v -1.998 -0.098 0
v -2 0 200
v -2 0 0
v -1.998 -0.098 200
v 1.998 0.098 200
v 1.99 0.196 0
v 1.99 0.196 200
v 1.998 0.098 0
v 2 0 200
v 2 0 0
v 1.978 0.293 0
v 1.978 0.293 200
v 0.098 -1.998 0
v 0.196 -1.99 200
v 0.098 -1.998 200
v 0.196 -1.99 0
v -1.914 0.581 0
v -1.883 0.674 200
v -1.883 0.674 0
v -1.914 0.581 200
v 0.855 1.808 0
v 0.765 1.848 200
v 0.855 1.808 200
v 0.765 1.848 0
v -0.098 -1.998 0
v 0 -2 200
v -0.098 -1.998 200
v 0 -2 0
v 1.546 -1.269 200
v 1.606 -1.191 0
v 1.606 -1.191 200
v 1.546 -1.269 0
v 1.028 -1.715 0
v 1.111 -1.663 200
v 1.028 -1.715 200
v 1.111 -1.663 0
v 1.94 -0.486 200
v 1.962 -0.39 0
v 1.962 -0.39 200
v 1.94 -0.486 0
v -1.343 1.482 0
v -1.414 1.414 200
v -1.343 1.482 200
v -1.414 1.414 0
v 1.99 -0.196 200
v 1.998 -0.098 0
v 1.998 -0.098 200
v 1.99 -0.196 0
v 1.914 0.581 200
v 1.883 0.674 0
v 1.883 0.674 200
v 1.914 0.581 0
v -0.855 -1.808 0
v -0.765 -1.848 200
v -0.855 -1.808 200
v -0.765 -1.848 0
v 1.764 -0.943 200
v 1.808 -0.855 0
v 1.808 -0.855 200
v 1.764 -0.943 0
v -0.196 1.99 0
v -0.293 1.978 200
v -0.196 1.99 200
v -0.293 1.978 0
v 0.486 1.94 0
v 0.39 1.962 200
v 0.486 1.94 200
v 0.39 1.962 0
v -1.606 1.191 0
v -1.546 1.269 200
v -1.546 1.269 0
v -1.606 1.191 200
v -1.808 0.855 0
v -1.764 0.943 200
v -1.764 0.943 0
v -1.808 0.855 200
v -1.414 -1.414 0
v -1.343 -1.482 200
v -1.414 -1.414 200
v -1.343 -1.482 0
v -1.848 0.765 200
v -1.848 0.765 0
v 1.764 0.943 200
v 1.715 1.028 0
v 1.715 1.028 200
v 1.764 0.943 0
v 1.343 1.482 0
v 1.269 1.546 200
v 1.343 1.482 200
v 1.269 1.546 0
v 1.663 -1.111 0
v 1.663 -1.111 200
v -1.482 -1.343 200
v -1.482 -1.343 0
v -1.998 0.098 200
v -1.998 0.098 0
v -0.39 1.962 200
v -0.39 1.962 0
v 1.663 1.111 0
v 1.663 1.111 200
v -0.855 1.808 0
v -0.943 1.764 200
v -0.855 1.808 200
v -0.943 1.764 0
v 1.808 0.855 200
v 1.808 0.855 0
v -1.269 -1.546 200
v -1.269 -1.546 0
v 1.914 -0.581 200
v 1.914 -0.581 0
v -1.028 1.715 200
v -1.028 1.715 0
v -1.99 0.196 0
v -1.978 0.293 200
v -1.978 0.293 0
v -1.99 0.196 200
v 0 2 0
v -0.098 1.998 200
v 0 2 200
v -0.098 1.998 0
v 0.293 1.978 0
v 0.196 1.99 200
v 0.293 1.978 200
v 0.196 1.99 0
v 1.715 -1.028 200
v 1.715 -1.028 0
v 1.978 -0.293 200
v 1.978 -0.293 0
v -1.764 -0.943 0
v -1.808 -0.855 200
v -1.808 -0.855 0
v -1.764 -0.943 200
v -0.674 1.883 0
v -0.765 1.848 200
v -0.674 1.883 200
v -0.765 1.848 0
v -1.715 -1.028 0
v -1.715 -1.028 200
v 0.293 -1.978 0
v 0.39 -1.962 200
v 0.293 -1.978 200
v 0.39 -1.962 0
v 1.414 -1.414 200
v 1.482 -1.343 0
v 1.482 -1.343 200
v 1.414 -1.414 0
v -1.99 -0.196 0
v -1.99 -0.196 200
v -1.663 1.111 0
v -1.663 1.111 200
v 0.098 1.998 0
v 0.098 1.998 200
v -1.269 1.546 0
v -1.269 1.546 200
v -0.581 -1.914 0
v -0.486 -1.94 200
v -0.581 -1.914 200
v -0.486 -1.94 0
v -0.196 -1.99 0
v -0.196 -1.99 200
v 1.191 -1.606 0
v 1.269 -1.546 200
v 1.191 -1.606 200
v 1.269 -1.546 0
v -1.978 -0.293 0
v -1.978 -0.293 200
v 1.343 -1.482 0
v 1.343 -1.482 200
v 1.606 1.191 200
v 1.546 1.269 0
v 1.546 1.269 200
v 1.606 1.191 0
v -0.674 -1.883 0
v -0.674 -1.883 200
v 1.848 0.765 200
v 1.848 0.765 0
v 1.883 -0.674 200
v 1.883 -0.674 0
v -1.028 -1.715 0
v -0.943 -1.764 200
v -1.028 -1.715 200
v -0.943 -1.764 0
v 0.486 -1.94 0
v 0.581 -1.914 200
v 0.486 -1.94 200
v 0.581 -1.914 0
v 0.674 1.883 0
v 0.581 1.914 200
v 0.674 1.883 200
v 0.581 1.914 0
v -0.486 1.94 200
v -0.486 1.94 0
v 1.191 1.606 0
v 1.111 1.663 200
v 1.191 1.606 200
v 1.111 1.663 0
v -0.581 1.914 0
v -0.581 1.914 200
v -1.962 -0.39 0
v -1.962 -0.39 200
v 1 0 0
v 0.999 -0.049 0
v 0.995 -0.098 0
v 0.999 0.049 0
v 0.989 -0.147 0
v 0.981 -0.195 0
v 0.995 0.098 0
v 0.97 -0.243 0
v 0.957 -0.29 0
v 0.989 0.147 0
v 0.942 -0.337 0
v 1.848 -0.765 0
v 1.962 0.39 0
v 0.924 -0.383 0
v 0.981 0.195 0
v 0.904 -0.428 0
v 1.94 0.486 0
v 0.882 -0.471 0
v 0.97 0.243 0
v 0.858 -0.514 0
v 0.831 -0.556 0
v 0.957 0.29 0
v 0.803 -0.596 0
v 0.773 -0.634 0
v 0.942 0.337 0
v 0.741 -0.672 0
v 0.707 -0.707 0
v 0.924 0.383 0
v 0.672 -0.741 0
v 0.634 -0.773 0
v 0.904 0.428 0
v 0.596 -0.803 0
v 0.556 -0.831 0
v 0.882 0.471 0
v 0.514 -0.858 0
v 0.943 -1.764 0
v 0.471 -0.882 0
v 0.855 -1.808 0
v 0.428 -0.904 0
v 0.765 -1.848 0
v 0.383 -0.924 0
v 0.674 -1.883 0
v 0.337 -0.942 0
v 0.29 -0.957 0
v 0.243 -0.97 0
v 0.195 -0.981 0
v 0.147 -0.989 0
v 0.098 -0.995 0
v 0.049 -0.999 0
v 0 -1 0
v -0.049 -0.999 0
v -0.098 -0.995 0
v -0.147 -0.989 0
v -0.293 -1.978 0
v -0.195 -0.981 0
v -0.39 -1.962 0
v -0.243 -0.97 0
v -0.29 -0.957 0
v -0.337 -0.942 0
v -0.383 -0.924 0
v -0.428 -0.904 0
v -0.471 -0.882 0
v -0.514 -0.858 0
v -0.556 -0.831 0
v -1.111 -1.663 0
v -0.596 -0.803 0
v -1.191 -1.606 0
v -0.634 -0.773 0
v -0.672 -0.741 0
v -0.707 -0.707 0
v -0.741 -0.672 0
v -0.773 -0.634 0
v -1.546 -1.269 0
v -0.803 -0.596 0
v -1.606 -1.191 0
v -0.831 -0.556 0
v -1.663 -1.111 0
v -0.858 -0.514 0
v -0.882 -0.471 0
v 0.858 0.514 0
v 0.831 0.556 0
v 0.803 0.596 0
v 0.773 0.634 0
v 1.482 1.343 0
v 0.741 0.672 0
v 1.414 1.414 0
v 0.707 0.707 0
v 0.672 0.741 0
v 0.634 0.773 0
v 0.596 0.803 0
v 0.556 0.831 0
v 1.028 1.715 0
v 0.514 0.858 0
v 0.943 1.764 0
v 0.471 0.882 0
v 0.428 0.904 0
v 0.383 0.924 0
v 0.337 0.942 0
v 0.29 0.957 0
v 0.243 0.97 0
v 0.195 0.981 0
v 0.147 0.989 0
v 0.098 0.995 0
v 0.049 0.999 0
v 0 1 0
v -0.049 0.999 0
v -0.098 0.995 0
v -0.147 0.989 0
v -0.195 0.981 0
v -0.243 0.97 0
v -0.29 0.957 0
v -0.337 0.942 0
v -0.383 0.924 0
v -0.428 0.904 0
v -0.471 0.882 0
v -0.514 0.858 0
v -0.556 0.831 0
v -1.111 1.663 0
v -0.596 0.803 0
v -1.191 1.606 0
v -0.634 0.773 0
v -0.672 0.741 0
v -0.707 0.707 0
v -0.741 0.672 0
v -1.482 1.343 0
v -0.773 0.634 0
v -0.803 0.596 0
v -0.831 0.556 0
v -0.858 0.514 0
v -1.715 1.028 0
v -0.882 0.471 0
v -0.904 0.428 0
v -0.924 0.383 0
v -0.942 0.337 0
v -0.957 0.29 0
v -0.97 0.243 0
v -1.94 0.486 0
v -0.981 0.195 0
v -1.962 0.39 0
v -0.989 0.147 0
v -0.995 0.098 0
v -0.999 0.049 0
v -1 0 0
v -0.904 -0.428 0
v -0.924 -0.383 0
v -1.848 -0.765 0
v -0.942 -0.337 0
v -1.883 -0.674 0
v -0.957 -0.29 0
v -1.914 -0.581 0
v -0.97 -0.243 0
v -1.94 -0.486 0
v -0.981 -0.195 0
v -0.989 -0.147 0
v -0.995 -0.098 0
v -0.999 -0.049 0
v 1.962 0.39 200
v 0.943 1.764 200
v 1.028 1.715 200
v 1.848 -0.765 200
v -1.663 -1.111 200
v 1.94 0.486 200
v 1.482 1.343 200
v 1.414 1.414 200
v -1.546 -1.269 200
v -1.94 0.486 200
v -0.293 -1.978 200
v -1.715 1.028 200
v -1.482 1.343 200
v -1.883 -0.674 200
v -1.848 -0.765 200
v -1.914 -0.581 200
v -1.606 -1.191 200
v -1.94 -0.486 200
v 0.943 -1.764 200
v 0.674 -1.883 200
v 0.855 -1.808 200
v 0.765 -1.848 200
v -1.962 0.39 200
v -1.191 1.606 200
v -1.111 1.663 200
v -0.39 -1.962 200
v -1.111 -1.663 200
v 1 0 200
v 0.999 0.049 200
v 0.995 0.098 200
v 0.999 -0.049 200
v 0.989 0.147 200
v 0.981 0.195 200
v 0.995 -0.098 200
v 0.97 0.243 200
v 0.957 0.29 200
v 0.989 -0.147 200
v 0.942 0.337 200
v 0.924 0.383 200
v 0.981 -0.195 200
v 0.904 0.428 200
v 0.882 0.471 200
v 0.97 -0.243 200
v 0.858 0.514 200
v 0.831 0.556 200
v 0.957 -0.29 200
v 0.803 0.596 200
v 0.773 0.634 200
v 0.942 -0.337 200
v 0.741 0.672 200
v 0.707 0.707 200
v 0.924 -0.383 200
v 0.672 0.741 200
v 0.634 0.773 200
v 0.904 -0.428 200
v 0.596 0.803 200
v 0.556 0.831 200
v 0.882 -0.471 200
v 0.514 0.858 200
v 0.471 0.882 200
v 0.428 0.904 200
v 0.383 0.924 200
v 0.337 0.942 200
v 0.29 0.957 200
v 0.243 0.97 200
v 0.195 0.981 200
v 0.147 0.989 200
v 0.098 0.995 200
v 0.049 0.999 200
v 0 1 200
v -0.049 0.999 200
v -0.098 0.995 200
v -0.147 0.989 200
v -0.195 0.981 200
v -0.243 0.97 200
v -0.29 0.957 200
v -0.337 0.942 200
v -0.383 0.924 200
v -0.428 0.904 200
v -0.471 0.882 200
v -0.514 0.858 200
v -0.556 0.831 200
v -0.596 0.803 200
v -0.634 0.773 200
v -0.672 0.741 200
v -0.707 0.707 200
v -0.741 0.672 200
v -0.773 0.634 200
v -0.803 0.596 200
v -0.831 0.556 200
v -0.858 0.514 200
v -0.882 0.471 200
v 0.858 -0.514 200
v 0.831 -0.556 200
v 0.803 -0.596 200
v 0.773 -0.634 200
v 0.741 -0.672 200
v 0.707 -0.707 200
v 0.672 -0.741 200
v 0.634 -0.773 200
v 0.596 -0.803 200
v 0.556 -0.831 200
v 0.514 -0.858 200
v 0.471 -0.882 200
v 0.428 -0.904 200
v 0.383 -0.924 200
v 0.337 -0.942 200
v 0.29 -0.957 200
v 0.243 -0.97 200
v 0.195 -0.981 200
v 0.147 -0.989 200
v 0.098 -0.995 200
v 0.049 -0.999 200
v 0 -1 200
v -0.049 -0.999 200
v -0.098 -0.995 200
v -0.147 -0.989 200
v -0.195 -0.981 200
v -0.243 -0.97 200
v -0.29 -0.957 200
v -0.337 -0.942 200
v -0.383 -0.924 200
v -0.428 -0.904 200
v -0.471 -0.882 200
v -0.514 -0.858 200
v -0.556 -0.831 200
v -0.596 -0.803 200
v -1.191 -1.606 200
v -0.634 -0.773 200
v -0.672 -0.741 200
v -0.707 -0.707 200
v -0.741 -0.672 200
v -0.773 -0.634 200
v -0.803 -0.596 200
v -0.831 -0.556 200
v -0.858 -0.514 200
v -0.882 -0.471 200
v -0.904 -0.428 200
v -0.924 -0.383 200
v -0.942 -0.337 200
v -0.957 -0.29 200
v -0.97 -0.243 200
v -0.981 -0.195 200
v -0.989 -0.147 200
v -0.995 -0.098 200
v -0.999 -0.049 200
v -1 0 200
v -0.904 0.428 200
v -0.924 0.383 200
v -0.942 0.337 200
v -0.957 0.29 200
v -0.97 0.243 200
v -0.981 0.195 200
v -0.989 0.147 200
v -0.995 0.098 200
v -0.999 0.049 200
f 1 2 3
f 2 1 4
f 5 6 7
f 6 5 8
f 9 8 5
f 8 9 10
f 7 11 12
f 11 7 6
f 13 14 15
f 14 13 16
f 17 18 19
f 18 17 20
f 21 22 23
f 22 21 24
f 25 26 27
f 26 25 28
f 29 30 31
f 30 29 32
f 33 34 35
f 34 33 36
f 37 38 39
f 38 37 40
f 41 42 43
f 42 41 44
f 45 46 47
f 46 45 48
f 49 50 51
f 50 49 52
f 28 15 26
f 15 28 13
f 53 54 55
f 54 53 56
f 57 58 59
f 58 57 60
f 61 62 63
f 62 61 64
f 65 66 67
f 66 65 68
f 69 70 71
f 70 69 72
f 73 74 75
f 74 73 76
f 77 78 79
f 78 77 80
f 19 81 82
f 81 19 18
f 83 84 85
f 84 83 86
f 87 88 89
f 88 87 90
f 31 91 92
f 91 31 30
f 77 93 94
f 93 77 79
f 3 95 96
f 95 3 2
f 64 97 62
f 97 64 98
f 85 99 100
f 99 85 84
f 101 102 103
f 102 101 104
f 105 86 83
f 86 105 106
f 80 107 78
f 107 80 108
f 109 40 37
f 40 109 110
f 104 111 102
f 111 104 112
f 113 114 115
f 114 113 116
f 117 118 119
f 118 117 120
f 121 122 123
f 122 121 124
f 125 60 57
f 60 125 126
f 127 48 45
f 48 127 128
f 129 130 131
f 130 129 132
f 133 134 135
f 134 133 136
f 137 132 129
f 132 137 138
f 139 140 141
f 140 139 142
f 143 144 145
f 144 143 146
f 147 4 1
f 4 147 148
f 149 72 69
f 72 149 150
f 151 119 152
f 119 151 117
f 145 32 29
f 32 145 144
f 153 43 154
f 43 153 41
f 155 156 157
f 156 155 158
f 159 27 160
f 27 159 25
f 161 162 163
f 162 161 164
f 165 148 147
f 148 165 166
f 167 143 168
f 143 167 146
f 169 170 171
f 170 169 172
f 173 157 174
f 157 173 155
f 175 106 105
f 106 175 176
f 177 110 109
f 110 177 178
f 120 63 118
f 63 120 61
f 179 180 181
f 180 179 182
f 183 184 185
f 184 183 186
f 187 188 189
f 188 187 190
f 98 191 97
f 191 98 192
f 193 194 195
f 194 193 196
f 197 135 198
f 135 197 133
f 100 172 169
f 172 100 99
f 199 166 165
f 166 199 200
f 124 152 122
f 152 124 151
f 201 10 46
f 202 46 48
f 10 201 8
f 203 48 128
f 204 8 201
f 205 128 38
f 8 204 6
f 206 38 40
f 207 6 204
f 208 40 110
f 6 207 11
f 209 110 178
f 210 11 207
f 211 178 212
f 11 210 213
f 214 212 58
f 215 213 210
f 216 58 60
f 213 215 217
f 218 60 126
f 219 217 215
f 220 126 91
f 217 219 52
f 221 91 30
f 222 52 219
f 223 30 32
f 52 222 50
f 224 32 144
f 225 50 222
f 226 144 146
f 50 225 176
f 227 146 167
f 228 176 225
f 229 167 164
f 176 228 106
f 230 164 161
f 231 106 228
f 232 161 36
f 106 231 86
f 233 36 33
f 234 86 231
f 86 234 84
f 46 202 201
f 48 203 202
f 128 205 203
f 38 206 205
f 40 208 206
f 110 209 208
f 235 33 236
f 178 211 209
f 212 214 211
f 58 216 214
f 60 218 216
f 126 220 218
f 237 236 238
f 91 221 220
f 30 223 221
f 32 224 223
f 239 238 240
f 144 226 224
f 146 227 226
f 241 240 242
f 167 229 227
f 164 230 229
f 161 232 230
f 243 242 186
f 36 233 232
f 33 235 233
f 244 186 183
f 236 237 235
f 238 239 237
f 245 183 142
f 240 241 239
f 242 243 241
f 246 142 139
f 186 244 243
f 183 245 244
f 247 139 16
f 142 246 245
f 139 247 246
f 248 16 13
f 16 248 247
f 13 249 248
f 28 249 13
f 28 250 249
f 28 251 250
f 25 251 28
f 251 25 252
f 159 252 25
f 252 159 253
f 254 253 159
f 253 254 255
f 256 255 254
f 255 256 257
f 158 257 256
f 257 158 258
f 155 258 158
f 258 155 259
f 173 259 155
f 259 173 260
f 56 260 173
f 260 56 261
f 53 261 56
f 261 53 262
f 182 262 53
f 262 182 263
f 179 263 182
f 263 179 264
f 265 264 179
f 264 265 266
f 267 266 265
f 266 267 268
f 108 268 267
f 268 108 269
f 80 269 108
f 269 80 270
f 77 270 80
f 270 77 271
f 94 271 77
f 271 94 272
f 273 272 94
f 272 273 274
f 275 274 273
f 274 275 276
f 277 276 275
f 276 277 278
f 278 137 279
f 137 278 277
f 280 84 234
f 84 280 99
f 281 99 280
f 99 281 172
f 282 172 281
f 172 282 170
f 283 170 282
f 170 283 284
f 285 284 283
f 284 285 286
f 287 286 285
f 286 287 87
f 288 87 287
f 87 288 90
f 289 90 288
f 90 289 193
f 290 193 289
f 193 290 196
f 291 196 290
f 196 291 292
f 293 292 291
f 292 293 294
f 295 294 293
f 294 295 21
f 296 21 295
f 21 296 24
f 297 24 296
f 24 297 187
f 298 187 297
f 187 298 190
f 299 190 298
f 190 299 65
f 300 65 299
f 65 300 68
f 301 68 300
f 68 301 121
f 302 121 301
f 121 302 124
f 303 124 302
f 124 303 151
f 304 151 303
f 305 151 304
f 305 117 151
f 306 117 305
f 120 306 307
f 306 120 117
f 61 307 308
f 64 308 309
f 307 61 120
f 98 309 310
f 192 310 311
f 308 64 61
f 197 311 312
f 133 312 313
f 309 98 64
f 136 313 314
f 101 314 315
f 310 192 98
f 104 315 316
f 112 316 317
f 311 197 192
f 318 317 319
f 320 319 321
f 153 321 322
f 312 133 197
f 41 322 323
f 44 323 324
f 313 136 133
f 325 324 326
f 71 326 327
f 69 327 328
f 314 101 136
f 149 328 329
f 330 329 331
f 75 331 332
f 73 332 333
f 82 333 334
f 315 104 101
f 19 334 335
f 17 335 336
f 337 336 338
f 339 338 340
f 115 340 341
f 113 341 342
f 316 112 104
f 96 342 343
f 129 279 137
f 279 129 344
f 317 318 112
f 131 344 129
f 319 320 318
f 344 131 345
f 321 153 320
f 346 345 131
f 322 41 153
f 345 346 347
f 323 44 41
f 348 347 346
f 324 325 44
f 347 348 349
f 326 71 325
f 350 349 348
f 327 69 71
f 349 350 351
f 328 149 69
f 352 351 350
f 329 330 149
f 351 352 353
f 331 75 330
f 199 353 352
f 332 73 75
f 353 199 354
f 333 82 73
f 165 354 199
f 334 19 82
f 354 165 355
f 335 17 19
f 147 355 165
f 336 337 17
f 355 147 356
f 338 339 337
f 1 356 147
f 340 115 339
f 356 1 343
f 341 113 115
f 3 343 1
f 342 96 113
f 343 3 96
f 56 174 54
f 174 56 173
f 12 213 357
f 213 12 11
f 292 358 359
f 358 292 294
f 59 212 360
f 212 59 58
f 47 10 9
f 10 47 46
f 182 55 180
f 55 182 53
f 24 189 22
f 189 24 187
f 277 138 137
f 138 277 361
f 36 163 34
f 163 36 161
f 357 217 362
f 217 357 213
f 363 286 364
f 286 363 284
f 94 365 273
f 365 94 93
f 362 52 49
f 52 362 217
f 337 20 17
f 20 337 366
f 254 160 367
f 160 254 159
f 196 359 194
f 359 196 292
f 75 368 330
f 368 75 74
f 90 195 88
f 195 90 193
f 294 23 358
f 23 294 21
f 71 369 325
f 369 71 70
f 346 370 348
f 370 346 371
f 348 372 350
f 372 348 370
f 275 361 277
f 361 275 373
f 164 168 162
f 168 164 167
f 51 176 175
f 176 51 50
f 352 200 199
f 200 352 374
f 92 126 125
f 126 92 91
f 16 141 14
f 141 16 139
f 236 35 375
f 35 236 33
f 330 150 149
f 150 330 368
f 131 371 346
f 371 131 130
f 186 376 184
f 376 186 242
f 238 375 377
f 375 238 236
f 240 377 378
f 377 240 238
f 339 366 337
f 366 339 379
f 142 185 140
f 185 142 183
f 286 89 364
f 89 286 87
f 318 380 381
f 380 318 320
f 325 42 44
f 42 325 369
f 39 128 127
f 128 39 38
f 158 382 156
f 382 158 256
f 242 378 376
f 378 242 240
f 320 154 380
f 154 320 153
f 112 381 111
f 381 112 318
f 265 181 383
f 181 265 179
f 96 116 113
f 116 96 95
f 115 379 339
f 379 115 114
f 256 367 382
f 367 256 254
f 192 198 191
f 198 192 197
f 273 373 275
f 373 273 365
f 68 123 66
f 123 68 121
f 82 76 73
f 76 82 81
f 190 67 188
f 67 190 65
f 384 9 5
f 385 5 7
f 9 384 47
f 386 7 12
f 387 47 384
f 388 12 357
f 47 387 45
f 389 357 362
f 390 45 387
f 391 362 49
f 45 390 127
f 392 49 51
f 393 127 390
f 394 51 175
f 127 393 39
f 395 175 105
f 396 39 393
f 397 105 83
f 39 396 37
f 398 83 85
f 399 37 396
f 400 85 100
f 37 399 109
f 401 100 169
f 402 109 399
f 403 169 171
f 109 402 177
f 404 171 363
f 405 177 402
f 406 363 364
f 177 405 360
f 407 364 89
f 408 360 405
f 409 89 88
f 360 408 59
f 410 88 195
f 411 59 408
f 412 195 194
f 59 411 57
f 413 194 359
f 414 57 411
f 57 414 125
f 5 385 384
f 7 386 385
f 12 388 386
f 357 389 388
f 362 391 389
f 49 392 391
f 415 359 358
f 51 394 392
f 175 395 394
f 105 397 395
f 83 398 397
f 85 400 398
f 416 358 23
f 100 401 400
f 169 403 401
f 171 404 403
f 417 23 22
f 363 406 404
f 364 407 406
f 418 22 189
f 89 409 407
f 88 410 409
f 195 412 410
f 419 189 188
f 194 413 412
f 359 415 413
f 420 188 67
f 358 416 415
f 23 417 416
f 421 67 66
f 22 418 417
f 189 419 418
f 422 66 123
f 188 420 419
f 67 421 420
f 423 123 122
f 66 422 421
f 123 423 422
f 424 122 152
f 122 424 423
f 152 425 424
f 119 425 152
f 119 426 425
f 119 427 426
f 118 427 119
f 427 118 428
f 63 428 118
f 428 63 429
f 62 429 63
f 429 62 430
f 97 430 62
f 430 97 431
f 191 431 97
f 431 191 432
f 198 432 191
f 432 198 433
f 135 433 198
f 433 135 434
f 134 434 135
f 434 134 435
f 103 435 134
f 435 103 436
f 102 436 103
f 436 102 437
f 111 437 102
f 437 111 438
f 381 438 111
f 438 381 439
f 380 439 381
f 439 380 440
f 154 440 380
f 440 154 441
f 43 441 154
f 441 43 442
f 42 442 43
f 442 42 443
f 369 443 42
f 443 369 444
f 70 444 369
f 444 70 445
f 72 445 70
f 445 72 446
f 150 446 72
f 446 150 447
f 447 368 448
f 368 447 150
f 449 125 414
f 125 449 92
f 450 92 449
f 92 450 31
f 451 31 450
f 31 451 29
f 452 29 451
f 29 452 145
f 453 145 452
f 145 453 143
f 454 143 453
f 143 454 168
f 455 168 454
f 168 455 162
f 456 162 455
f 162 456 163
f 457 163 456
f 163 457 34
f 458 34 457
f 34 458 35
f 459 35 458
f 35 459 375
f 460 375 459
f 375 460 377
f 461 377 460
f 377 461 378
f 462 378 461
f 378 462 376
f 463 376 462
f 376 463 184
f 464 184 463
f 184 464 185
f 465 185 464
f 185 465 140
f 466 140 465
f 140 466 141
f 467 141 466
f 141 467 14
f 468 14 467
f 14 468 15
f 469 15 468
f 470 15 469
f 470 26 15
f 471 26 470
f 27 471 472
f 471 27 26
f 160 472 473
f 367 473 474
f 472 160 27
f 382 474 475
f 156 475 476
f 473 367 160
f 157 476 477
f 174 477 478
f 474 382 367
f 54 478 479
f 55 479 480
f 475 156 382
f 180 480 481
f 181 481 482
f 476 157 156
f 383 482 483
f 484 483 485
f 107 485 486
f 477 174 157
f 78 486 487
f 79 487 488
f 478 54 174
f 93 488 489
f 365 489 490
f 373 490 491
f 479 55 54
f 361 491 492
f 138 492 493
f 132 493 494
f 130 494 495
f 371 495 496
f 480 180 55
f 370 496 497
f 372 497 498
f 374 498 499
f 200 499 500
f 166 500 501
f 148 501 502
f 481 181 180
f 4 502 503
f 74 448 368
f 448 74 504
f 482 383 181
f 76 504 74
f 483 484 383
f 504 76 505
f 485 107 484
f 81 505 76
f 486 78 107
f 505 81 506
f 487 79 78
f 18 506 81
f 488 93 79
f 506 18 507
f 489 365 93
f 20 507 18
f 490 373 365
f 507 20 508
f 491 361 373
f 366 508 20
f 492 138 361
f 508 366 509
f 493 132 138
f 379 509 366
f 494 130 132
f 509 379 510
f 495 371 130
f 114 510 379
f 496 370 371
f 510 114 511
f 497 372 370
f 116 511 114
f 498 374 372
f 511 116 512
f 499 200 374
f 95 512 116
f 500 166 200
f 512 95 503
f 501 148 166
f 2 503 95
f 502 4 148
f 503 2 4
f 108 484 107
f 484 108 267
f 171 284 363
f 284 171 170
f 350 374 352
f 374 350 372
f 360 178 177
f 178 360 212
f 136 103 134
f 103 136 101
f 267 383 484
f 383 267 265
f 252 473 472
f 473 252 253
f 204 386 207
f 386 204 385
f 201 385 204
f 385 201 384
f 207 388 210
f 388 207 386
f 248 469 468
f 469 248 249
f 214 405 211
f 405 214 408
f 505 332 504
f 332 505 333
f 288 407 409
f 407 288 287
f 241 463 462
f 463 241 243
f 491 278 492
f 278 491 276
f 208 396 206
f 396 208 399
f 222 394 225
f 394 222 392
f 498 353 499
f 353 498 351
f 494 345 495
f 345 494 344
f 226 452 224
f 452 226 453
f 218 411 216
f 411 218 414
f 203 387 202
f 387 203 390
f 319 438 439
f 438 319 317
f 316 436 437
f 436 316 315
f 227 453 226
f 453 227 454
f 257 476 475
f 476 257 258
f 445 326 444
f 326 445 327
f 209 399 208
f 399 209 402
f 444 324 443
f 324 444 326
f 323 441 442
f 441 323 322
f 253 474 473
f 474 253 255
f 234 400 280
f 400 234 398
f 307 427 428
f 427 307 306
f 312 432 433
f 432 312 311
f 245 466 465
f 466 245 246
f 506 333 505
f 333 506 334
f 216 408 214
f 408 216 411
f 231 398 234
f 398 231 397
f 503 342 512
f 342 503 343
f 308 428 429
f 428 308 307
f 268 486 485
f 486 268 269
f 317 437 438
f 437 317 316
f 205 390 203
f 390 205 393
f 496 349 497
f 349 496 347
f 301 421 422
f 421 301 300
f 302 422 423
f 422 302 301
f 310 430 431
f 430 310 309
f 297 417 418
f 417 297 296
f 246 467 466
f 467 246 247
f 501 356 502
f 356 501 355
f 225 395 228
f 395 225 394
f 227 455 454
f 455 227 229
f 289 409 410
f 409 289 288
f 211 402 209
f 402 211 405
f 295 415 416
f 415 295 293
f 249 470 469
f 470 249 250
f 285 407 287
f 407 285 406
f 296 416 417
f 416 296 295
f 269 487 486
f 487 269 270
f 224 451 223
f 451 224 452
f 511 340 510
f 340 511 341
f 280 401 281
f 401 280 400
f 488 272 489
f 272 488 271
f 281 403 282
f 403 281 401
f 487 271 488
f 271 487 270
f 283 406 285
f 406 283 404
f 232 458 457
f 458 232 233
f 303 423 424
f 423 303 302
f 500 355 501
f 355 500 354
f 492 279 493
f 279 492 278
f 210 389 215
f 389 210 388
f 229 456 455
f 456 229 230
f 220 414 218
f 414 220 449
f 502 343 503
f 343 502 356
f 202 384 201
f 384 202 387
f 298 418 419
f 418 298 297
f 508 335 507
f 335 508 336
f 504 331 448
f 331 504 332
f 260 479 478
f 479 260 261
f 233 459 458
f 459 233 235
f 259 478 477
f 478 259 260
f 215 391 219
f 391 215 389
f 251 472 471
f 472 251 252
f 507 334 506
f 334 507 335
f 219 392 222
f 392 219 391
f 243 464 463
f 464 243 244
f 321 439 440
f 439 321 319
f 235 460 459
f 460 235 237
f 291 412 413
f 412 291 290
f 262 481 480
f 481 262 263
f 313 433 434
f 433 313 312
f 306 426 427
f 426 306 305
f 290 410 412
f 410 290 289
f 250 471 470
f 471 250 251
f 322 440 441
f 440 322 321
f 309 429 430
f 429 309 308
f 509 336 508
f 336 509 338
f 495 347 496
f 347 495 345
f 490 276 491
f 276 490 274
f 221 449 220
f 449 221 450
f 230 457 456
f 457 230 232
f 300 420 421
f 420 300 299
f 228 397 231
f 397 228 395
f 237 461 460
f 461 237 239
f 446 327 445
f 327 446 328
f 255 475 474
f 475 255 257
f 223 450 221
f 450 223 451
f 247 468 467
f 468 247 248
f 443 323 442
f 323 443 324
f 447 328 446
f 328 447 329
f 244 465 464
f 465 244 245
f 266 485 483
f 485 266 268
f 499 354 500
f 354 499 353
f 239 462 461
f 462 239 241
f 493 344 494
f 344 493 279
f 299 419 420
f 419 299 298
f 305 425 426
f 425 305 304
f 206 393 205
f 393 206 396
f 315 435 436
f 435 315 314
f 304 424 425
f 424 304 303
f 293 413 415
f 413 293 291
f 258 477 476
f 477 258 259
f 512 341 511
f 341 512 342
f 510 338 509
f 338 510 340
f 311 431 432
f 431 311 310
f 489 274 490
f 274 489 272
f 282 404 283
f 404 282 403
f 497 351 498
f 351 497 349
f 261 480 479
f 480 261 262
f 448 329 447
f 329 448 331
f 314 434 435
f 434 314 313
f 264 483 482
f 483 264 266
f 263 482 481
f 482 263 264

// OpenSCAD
$fn = 128;

// PTFE tubing parameters (mm)
outer_d = 4.0;
inner_d = 2.0;
length  = 200.0;

module ptfe_tube(od, id, len) {
    difference() {
        cylinder(h = len, d = od, center = false);
        translate([0,0,-0.1])
            cylinder(h = len + 0.2, d = id, center = false);
    }
}

ptfe_tube(outer_d, inner_d, length);
